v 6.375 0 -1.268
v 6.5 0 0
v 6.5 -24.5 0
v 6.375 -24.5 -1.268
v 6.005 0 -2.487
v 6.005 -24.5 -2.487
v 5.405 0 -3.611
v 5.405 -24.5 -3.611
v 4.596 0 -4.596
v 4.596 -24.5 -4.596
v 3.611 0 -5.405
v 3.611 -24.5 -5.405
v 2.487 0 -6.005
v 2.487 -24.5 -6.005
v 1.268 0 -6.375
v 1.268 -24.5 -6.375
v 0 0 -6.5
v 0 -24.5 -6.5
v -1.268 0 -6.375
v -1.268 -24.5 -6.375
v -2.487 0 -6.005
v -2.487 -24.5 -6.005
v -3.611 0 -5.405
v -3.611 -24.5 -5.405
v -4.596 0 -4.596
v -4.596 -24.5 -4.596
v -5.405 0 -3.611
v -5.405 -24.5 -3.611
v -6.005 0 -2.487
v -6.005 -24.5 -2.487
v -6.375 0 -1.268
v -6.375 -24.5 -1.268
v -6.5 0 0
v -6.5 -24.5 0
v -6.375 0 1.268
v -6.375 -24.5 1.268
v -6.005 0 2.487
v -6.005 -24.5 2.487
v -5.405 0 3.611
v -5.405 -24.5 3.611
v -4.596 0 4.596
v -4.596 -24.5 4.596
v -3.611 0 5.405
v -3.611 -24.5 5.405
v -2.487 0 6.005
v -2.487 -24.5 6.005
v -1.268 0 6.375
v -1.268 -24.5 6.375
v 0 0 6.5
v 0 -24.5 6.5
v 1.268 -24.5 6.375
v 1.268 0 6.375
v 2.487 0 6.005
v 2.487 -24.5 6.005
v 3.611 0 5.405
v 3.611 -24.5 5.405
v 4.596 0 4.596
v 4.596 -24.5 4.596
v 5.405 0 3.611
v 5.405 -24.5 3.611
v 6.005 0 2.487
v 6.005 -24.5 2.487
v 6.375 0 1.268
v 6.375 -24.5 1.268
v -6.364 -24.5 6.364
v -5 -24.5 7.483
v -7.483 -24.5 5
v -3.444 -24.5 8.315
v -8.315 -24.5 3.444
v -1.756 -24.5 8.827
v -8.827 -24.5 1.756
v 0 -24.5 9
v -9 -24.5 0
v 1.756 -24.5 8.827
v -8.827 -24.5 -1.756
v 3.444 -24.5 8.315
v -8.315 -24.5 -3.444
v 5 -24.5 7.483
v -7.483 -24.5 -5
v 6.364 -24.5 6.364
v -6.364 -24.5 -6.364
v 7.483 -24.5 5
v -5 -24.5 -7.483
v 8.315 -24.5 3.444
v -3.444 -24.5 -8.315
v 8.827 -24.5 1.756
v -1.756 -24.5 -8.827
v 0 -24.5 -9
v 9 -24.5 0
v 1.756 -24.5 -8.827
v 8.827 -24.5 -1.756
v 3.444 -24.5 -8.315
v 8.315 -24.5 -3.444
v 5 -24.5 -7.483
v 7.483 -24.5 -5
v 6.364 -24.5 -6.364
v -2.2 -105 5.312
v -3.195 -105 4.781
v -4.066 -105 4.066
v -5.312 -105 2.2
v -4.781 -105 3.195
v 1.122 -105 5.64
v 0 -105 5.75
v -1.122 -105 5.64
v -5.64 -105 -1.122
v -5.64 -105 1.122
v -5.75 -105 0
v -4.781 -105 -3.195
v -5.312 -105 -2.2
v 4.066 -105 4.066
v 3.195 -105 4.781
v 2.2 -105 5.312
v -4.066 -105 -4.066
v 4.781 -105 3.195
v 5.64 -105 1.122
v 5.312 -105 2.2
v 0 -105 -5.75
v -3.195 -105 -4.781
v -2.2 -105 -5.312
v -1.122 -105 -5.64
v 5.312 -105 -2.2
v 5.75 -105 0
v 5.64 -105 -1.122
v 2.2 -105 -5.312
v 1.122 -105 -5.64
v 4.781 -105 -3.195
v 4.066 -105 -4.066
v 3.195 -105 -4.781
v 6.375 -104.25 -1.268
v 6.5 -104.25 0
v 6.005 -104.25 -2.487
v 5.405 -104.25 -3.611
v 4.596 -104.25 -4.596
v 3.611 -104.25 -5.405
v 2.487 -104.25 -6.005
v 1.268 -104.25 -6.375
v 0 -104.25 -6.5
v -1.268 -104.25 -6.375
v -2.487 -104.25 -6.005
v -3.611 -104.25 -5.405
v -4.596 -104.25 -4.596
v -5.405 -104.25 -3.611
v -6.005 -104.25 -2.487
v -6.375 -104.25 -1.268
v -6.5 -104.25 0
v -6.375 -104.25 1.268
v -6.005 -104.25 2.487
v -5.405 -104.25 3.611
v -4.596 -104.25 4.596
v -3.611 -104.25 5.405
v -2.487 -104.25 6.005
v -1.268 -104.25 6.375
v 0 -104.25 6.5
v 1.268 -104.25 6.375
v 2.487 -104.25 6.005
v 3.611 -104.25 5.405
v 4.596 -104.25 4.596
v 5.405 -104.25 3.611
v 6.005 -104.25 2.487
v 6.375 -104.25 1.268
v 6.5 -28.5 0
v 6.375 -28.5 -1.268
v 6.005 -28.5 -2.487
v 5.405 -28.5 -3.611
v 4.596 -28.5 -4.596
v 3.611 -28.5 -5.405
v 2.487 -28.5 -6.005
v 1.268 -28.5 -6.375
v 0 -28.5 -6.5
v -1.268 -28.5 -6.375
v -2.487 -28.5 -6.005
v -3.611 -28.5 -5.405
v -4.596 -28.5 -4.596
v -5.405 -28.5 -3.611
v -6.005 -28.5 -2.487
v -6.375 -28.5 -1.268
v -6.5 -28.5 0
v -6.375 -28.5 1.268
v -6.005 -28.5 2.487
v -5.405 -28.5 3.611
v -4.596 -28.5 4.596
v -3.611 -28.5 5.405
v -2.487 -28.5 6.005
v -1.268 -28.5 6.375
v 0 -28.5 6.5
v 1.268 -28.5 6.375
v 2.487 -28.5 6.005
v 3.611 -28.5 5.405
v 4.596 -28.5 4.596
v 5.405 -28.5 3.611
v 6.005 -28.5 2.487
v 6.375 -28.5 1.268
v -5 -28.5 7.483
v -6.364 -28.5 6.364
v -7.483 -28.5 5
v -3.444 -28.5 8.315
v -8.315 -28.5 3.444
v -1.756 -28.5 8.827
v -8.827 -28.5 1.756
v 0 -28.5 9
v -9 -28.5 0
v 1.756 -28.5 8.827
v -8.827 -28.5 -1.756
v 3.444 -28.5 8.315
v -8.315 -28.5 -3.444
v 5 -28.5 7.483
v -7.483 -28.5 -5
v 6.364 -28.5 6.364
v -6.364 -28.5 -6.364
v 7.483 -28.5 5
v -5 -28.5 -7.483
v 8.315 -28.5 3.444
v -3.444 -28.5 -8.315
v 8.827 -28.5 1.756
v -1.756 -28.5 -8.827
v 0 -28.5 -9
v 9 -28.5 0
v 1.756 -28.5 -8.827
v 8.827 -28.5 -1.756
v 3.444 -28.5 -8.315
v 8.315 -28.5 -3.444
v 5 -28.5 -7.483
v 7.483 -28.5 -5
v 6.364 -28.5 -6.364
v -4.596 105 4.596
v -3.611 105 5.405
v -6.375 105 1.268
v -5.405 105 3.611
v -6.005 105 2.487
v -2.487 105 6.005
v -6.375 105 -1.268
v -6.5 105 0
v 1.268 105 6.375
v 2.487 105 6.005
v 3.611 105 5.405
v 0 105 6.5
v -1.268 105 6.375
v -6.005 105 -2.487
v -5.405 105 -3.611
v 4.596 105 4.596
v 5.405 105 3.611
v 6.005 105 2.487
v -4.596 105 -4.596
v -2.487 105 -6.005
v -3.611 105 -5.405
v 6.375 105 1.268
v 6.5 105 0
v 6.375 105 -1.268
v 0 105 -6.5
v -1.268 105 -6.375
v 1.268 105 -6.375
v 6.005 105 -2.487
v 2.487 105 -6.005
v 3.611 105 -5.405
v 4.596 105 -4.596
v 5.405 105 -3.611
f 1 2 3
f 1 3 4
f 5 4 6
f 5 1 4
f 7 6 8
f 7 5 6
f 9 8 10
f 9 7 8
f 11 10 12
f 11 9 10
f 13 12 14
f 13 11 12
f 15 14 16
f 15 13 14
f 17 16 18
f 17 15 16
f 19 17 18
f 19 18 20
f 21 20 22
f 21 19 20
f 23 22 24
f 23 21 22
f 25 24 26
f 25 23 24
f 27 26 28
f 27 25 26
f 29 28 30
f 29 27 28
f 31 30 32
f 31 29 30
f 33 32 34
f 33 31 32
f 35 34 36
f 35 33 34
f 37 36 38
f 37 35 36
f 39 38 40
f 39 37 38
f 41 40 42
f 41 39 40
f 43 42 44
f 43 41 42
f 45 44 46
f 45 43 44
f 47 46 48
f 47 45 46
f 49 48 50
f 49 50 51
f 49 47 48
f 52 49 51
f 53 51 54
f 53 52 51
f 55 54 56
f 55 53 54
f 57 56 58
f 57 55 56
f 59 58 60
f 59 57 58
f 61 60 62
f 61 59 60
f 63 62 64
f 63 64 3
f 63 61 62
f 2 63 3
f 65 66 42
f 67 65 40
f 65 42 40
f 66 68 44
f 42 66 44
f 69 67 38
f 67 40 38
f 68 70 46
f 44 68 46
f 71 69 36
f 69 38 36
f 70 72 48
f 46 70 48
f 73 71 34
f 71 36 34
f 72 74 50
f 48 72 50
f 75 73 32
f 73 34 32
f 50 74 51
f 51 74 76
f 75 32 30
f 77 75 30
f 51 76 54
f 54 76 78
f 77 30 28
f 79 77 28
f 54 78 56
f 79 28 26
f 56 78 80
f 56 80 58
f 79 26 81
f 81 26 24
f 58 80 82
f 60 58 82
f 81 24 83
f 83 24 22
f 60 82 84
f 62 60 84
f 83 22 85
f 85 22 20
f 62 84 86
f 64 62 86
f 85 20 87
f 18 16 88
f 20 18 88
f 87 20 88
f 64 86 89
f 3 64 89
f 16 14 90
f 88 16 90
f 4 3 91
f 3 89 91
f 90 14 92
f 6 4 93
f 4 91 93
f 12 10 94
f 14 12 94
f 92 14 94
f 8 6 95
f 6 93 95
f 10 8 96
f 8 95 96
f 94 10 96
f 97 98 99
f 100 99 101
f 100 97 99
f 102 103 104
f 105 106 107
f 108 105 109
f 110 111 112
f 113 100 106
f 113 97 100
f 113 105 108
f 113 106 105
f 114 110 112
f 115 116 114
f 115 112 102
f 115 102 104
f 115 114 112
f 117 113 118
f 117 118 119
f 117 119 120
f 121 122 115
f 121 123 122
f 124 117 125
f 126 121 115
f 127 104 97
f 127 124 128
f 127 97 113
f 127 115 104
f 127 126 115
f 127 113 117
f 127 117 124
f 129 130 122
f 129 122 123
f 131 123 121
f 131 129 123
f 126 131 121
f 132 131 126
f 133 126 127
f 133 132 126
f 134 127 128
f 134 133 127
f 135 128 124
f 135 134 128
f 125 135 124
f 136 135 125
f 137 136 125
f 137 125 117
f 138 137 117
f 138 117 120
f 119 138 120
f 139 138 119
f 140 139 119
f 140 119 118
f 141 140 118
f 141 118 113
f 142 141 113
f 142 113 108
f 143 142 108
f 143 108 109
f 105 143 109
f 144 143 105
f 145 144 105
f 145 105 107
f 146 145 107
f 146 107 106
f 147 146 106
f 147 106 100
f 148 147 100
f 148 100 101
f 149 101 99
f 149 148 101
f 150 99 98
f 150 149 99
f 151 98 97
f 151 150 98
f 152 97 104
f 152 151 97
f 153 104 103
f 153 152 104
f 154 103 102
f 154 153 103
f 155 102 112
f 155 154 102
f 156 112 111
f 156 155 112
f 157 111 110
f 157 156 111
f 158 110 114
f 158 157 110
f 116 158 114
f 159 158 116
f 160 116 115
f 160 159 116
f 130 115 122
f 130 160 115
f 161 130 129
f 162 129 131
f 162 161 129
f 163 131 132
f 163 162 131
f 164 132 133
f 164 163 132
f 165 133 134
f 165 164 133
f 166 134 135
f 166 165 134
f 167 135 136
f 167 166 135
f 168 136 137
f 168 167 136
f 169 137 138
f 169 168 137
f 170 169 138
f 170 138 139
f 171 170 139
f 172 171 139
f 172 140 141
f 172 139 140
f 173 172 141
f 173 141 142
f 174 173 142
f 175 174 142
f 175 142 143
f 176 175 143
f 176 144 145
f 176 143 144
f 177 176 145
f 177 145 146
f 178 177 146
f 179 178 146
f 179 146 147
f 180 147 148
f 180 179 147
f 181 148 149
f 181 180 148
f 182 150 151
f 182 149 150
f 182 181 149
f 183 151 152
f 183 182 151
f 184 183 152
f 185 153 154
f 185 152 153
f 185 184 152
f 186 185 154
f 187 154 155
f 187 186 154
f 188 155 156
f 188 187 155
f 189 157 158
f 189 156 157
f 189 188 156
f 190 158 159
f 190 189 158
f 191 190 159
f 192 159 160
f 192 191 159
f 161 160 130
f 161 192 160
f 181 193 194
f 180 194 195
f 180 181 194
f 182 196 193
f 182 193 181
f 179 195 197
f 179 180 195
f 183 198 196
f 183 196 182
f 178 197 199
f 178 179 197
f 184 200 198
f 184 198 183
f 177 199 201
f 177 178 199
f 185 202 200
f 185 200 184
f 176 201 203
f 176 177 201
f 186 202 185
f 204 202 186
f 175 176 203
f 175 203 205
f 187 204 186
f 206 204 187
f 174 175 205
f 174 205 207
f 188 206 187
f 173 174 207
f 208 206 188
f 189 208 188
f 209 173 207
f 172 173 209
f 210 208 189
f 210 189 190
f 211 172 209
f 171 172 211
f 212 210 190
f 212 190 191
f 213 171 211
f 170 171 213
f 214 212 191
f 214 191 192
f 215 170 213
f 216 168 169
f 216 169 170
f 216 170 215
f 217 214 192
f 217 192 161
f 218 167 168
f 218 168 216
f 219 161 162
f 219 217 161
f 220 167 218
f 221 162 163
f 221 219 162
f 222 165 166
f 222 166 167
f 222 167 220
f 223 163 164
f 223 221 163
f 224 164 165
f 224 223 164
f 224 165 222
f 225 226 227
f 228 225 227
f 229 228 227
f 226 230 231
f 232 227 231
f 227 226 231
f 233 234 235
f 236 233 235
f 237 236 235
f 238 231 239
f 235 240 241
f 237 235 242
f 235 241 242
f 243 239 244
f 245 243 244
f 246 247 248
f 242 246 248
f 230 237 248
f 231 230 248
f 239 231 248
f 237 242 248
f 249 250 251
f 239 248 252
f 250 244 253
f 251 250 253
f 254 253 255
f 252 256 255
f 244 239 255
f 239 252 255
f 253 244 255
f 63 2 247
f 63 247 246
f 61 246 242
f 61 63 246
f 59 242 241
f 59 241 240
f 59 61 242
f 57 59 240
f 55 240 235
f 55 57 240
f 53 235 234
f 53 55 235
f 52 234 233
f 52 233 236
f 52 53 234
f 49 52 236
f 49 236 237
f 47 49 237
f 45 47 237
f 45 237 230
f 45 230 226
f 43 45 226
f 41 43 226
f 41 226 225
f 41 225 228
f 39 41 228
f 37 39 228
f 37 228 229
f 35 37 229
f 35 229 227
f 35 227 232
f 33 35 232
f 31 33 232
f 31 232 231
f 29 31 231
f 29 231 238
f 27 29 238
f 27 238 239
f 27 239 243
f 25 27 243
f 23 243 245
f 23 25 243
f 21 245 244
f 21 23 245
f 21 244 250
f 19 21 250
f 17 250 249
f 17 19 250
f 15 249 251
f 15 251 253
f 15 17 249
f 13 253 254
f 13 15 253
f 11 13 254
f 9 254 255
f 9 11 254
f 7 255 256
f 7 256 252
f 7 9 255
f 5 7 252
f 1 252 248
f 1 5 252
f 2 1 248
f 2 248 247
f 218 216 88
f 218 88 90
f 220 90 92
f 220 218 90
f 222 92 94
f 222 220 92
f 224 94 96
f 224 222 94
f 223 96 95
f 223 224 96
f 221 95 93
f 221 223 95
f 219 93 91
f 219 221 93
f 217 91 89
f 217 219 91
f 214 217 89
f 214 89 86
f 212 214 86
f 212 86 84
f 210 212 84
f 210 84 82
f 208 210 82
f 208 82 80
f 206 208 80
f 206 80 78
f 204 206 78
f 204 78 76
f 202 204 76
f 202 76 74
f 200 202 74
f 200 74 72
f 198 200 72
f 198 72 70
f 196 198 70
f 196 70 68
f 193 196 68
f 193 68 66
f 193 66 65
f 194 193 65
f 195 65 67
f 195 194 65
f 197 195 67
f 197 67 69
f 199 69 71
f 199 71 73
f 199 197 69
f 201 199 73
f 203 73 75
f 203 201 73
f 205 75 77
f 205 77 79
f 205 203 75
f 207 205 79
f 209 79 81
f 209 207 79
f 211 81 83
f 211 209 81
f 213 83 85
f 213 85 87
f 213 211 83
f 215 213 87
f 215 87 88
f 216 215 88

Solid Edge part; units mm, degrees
sketch "Sketch1" plane through (0, 0, 0) normal (0, -1, 0) x (1, 0, 0)
  circle A0 centre (0, 0) radius 6.5
  dimension "D1" = 13
extrude "Protrusion1" add sketch "Sketch1" along normal mid plane 210
sketch "Sketch2" plane through (0, -28.5, 0) normal (0, -1, 0) x (0, 0, -1)
  circle A0 centre (0, 0) radius 9
  dimension "D1" = 18
extrude "ExtrudedProtrusion_2" add sketch "Sketch2" against normal blind 4
chamfer "Chamfer_1" distance 0.75 angle 45 1 edges at (-6.5, -105, 0)
properties part number "SMV-102-4" material "STEEL, 4140"
